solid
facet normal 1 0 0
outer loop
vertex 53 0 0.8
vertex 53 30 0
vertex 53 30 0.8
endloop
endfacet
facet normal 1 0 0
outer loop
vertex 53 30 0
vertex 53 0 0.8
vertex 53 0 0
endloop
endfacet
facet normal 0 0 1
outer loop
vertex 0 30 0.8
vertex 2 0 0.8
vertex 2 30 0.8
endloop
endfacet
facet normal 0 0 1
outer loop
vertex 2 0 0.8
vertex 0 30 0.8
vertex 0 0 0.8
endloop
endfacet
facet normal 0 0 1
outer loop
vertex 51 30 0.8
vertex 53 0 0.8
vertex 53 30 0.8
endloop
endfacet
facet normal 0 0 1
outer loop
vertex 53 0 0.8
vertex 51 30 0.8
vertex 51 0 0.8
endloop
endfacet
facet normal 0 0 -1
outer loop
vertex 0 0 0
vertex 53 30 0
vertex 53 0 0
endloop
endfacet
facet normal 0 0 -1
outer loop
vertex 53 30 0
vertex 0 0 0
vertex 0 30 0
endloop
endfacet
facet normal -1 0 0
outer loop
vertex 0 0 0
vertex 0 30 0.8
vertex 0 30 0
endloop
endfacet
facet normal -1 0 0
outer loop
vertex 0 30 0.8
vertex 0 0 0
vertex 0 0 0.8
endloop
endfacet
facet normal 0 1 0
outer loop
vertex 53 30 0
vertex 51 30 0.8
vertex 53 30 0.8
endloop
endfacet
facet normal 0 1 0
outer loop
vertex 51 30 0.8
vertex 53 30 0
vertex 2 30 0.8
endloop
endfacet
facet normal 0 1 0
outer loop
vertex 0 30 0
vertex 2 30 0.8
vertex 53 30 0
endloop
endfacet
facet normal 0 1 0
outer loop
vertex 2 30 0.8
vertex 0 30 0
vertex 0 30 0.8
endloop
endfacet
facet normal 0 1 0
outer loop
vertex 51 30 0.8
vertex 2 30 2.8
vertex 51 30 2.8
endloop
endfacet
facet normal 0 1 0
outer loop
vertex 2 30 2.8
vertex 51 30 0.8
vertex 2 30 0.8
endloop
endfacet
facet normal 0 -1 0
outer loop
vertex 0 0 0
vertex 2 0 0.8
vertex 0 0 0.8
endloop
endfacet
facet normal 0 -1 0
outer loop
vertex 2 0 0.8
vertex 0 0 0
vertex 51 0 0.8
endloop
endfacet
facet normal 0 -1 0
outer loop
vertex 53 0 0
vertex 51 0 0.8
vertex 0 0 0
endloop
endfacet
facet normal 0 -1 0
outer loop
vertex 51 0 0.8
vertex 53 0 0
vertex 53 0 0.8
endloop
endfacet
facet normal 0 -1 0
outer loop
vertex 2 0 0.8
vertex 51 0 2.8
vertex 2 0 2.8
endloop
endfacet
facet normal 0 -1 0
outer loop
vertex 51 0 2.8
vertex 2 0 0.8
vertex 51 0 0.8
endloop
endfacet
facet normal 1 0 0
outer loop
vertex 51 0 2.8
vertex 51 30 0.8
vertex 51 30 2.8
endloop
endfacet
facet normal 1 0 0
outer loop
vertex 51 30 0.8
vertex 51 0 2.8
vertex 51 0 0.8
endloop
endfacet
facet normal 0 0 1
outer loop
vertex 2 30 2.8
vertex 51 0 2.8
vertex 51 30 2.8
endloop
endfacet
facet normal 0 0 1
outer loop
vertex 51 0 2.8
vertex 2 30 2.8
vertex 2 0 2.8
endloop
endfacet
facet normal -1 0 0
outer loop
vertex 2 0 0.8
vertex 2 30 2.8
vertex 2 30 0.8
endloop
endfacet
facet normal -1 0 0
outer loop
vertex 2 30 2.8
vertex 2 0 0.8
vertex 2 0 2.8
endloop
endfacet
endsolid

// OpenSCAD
pcb_t = 0.8;
pcb_w = 30;
pcb_l = 53;

union() {
  cube([pcb_l,pcb_w,pcb_t]);
  translate([2,0,0]) cube([pcb_l-4,pcb_w,pcb_t+2]); // For stiffness
}
